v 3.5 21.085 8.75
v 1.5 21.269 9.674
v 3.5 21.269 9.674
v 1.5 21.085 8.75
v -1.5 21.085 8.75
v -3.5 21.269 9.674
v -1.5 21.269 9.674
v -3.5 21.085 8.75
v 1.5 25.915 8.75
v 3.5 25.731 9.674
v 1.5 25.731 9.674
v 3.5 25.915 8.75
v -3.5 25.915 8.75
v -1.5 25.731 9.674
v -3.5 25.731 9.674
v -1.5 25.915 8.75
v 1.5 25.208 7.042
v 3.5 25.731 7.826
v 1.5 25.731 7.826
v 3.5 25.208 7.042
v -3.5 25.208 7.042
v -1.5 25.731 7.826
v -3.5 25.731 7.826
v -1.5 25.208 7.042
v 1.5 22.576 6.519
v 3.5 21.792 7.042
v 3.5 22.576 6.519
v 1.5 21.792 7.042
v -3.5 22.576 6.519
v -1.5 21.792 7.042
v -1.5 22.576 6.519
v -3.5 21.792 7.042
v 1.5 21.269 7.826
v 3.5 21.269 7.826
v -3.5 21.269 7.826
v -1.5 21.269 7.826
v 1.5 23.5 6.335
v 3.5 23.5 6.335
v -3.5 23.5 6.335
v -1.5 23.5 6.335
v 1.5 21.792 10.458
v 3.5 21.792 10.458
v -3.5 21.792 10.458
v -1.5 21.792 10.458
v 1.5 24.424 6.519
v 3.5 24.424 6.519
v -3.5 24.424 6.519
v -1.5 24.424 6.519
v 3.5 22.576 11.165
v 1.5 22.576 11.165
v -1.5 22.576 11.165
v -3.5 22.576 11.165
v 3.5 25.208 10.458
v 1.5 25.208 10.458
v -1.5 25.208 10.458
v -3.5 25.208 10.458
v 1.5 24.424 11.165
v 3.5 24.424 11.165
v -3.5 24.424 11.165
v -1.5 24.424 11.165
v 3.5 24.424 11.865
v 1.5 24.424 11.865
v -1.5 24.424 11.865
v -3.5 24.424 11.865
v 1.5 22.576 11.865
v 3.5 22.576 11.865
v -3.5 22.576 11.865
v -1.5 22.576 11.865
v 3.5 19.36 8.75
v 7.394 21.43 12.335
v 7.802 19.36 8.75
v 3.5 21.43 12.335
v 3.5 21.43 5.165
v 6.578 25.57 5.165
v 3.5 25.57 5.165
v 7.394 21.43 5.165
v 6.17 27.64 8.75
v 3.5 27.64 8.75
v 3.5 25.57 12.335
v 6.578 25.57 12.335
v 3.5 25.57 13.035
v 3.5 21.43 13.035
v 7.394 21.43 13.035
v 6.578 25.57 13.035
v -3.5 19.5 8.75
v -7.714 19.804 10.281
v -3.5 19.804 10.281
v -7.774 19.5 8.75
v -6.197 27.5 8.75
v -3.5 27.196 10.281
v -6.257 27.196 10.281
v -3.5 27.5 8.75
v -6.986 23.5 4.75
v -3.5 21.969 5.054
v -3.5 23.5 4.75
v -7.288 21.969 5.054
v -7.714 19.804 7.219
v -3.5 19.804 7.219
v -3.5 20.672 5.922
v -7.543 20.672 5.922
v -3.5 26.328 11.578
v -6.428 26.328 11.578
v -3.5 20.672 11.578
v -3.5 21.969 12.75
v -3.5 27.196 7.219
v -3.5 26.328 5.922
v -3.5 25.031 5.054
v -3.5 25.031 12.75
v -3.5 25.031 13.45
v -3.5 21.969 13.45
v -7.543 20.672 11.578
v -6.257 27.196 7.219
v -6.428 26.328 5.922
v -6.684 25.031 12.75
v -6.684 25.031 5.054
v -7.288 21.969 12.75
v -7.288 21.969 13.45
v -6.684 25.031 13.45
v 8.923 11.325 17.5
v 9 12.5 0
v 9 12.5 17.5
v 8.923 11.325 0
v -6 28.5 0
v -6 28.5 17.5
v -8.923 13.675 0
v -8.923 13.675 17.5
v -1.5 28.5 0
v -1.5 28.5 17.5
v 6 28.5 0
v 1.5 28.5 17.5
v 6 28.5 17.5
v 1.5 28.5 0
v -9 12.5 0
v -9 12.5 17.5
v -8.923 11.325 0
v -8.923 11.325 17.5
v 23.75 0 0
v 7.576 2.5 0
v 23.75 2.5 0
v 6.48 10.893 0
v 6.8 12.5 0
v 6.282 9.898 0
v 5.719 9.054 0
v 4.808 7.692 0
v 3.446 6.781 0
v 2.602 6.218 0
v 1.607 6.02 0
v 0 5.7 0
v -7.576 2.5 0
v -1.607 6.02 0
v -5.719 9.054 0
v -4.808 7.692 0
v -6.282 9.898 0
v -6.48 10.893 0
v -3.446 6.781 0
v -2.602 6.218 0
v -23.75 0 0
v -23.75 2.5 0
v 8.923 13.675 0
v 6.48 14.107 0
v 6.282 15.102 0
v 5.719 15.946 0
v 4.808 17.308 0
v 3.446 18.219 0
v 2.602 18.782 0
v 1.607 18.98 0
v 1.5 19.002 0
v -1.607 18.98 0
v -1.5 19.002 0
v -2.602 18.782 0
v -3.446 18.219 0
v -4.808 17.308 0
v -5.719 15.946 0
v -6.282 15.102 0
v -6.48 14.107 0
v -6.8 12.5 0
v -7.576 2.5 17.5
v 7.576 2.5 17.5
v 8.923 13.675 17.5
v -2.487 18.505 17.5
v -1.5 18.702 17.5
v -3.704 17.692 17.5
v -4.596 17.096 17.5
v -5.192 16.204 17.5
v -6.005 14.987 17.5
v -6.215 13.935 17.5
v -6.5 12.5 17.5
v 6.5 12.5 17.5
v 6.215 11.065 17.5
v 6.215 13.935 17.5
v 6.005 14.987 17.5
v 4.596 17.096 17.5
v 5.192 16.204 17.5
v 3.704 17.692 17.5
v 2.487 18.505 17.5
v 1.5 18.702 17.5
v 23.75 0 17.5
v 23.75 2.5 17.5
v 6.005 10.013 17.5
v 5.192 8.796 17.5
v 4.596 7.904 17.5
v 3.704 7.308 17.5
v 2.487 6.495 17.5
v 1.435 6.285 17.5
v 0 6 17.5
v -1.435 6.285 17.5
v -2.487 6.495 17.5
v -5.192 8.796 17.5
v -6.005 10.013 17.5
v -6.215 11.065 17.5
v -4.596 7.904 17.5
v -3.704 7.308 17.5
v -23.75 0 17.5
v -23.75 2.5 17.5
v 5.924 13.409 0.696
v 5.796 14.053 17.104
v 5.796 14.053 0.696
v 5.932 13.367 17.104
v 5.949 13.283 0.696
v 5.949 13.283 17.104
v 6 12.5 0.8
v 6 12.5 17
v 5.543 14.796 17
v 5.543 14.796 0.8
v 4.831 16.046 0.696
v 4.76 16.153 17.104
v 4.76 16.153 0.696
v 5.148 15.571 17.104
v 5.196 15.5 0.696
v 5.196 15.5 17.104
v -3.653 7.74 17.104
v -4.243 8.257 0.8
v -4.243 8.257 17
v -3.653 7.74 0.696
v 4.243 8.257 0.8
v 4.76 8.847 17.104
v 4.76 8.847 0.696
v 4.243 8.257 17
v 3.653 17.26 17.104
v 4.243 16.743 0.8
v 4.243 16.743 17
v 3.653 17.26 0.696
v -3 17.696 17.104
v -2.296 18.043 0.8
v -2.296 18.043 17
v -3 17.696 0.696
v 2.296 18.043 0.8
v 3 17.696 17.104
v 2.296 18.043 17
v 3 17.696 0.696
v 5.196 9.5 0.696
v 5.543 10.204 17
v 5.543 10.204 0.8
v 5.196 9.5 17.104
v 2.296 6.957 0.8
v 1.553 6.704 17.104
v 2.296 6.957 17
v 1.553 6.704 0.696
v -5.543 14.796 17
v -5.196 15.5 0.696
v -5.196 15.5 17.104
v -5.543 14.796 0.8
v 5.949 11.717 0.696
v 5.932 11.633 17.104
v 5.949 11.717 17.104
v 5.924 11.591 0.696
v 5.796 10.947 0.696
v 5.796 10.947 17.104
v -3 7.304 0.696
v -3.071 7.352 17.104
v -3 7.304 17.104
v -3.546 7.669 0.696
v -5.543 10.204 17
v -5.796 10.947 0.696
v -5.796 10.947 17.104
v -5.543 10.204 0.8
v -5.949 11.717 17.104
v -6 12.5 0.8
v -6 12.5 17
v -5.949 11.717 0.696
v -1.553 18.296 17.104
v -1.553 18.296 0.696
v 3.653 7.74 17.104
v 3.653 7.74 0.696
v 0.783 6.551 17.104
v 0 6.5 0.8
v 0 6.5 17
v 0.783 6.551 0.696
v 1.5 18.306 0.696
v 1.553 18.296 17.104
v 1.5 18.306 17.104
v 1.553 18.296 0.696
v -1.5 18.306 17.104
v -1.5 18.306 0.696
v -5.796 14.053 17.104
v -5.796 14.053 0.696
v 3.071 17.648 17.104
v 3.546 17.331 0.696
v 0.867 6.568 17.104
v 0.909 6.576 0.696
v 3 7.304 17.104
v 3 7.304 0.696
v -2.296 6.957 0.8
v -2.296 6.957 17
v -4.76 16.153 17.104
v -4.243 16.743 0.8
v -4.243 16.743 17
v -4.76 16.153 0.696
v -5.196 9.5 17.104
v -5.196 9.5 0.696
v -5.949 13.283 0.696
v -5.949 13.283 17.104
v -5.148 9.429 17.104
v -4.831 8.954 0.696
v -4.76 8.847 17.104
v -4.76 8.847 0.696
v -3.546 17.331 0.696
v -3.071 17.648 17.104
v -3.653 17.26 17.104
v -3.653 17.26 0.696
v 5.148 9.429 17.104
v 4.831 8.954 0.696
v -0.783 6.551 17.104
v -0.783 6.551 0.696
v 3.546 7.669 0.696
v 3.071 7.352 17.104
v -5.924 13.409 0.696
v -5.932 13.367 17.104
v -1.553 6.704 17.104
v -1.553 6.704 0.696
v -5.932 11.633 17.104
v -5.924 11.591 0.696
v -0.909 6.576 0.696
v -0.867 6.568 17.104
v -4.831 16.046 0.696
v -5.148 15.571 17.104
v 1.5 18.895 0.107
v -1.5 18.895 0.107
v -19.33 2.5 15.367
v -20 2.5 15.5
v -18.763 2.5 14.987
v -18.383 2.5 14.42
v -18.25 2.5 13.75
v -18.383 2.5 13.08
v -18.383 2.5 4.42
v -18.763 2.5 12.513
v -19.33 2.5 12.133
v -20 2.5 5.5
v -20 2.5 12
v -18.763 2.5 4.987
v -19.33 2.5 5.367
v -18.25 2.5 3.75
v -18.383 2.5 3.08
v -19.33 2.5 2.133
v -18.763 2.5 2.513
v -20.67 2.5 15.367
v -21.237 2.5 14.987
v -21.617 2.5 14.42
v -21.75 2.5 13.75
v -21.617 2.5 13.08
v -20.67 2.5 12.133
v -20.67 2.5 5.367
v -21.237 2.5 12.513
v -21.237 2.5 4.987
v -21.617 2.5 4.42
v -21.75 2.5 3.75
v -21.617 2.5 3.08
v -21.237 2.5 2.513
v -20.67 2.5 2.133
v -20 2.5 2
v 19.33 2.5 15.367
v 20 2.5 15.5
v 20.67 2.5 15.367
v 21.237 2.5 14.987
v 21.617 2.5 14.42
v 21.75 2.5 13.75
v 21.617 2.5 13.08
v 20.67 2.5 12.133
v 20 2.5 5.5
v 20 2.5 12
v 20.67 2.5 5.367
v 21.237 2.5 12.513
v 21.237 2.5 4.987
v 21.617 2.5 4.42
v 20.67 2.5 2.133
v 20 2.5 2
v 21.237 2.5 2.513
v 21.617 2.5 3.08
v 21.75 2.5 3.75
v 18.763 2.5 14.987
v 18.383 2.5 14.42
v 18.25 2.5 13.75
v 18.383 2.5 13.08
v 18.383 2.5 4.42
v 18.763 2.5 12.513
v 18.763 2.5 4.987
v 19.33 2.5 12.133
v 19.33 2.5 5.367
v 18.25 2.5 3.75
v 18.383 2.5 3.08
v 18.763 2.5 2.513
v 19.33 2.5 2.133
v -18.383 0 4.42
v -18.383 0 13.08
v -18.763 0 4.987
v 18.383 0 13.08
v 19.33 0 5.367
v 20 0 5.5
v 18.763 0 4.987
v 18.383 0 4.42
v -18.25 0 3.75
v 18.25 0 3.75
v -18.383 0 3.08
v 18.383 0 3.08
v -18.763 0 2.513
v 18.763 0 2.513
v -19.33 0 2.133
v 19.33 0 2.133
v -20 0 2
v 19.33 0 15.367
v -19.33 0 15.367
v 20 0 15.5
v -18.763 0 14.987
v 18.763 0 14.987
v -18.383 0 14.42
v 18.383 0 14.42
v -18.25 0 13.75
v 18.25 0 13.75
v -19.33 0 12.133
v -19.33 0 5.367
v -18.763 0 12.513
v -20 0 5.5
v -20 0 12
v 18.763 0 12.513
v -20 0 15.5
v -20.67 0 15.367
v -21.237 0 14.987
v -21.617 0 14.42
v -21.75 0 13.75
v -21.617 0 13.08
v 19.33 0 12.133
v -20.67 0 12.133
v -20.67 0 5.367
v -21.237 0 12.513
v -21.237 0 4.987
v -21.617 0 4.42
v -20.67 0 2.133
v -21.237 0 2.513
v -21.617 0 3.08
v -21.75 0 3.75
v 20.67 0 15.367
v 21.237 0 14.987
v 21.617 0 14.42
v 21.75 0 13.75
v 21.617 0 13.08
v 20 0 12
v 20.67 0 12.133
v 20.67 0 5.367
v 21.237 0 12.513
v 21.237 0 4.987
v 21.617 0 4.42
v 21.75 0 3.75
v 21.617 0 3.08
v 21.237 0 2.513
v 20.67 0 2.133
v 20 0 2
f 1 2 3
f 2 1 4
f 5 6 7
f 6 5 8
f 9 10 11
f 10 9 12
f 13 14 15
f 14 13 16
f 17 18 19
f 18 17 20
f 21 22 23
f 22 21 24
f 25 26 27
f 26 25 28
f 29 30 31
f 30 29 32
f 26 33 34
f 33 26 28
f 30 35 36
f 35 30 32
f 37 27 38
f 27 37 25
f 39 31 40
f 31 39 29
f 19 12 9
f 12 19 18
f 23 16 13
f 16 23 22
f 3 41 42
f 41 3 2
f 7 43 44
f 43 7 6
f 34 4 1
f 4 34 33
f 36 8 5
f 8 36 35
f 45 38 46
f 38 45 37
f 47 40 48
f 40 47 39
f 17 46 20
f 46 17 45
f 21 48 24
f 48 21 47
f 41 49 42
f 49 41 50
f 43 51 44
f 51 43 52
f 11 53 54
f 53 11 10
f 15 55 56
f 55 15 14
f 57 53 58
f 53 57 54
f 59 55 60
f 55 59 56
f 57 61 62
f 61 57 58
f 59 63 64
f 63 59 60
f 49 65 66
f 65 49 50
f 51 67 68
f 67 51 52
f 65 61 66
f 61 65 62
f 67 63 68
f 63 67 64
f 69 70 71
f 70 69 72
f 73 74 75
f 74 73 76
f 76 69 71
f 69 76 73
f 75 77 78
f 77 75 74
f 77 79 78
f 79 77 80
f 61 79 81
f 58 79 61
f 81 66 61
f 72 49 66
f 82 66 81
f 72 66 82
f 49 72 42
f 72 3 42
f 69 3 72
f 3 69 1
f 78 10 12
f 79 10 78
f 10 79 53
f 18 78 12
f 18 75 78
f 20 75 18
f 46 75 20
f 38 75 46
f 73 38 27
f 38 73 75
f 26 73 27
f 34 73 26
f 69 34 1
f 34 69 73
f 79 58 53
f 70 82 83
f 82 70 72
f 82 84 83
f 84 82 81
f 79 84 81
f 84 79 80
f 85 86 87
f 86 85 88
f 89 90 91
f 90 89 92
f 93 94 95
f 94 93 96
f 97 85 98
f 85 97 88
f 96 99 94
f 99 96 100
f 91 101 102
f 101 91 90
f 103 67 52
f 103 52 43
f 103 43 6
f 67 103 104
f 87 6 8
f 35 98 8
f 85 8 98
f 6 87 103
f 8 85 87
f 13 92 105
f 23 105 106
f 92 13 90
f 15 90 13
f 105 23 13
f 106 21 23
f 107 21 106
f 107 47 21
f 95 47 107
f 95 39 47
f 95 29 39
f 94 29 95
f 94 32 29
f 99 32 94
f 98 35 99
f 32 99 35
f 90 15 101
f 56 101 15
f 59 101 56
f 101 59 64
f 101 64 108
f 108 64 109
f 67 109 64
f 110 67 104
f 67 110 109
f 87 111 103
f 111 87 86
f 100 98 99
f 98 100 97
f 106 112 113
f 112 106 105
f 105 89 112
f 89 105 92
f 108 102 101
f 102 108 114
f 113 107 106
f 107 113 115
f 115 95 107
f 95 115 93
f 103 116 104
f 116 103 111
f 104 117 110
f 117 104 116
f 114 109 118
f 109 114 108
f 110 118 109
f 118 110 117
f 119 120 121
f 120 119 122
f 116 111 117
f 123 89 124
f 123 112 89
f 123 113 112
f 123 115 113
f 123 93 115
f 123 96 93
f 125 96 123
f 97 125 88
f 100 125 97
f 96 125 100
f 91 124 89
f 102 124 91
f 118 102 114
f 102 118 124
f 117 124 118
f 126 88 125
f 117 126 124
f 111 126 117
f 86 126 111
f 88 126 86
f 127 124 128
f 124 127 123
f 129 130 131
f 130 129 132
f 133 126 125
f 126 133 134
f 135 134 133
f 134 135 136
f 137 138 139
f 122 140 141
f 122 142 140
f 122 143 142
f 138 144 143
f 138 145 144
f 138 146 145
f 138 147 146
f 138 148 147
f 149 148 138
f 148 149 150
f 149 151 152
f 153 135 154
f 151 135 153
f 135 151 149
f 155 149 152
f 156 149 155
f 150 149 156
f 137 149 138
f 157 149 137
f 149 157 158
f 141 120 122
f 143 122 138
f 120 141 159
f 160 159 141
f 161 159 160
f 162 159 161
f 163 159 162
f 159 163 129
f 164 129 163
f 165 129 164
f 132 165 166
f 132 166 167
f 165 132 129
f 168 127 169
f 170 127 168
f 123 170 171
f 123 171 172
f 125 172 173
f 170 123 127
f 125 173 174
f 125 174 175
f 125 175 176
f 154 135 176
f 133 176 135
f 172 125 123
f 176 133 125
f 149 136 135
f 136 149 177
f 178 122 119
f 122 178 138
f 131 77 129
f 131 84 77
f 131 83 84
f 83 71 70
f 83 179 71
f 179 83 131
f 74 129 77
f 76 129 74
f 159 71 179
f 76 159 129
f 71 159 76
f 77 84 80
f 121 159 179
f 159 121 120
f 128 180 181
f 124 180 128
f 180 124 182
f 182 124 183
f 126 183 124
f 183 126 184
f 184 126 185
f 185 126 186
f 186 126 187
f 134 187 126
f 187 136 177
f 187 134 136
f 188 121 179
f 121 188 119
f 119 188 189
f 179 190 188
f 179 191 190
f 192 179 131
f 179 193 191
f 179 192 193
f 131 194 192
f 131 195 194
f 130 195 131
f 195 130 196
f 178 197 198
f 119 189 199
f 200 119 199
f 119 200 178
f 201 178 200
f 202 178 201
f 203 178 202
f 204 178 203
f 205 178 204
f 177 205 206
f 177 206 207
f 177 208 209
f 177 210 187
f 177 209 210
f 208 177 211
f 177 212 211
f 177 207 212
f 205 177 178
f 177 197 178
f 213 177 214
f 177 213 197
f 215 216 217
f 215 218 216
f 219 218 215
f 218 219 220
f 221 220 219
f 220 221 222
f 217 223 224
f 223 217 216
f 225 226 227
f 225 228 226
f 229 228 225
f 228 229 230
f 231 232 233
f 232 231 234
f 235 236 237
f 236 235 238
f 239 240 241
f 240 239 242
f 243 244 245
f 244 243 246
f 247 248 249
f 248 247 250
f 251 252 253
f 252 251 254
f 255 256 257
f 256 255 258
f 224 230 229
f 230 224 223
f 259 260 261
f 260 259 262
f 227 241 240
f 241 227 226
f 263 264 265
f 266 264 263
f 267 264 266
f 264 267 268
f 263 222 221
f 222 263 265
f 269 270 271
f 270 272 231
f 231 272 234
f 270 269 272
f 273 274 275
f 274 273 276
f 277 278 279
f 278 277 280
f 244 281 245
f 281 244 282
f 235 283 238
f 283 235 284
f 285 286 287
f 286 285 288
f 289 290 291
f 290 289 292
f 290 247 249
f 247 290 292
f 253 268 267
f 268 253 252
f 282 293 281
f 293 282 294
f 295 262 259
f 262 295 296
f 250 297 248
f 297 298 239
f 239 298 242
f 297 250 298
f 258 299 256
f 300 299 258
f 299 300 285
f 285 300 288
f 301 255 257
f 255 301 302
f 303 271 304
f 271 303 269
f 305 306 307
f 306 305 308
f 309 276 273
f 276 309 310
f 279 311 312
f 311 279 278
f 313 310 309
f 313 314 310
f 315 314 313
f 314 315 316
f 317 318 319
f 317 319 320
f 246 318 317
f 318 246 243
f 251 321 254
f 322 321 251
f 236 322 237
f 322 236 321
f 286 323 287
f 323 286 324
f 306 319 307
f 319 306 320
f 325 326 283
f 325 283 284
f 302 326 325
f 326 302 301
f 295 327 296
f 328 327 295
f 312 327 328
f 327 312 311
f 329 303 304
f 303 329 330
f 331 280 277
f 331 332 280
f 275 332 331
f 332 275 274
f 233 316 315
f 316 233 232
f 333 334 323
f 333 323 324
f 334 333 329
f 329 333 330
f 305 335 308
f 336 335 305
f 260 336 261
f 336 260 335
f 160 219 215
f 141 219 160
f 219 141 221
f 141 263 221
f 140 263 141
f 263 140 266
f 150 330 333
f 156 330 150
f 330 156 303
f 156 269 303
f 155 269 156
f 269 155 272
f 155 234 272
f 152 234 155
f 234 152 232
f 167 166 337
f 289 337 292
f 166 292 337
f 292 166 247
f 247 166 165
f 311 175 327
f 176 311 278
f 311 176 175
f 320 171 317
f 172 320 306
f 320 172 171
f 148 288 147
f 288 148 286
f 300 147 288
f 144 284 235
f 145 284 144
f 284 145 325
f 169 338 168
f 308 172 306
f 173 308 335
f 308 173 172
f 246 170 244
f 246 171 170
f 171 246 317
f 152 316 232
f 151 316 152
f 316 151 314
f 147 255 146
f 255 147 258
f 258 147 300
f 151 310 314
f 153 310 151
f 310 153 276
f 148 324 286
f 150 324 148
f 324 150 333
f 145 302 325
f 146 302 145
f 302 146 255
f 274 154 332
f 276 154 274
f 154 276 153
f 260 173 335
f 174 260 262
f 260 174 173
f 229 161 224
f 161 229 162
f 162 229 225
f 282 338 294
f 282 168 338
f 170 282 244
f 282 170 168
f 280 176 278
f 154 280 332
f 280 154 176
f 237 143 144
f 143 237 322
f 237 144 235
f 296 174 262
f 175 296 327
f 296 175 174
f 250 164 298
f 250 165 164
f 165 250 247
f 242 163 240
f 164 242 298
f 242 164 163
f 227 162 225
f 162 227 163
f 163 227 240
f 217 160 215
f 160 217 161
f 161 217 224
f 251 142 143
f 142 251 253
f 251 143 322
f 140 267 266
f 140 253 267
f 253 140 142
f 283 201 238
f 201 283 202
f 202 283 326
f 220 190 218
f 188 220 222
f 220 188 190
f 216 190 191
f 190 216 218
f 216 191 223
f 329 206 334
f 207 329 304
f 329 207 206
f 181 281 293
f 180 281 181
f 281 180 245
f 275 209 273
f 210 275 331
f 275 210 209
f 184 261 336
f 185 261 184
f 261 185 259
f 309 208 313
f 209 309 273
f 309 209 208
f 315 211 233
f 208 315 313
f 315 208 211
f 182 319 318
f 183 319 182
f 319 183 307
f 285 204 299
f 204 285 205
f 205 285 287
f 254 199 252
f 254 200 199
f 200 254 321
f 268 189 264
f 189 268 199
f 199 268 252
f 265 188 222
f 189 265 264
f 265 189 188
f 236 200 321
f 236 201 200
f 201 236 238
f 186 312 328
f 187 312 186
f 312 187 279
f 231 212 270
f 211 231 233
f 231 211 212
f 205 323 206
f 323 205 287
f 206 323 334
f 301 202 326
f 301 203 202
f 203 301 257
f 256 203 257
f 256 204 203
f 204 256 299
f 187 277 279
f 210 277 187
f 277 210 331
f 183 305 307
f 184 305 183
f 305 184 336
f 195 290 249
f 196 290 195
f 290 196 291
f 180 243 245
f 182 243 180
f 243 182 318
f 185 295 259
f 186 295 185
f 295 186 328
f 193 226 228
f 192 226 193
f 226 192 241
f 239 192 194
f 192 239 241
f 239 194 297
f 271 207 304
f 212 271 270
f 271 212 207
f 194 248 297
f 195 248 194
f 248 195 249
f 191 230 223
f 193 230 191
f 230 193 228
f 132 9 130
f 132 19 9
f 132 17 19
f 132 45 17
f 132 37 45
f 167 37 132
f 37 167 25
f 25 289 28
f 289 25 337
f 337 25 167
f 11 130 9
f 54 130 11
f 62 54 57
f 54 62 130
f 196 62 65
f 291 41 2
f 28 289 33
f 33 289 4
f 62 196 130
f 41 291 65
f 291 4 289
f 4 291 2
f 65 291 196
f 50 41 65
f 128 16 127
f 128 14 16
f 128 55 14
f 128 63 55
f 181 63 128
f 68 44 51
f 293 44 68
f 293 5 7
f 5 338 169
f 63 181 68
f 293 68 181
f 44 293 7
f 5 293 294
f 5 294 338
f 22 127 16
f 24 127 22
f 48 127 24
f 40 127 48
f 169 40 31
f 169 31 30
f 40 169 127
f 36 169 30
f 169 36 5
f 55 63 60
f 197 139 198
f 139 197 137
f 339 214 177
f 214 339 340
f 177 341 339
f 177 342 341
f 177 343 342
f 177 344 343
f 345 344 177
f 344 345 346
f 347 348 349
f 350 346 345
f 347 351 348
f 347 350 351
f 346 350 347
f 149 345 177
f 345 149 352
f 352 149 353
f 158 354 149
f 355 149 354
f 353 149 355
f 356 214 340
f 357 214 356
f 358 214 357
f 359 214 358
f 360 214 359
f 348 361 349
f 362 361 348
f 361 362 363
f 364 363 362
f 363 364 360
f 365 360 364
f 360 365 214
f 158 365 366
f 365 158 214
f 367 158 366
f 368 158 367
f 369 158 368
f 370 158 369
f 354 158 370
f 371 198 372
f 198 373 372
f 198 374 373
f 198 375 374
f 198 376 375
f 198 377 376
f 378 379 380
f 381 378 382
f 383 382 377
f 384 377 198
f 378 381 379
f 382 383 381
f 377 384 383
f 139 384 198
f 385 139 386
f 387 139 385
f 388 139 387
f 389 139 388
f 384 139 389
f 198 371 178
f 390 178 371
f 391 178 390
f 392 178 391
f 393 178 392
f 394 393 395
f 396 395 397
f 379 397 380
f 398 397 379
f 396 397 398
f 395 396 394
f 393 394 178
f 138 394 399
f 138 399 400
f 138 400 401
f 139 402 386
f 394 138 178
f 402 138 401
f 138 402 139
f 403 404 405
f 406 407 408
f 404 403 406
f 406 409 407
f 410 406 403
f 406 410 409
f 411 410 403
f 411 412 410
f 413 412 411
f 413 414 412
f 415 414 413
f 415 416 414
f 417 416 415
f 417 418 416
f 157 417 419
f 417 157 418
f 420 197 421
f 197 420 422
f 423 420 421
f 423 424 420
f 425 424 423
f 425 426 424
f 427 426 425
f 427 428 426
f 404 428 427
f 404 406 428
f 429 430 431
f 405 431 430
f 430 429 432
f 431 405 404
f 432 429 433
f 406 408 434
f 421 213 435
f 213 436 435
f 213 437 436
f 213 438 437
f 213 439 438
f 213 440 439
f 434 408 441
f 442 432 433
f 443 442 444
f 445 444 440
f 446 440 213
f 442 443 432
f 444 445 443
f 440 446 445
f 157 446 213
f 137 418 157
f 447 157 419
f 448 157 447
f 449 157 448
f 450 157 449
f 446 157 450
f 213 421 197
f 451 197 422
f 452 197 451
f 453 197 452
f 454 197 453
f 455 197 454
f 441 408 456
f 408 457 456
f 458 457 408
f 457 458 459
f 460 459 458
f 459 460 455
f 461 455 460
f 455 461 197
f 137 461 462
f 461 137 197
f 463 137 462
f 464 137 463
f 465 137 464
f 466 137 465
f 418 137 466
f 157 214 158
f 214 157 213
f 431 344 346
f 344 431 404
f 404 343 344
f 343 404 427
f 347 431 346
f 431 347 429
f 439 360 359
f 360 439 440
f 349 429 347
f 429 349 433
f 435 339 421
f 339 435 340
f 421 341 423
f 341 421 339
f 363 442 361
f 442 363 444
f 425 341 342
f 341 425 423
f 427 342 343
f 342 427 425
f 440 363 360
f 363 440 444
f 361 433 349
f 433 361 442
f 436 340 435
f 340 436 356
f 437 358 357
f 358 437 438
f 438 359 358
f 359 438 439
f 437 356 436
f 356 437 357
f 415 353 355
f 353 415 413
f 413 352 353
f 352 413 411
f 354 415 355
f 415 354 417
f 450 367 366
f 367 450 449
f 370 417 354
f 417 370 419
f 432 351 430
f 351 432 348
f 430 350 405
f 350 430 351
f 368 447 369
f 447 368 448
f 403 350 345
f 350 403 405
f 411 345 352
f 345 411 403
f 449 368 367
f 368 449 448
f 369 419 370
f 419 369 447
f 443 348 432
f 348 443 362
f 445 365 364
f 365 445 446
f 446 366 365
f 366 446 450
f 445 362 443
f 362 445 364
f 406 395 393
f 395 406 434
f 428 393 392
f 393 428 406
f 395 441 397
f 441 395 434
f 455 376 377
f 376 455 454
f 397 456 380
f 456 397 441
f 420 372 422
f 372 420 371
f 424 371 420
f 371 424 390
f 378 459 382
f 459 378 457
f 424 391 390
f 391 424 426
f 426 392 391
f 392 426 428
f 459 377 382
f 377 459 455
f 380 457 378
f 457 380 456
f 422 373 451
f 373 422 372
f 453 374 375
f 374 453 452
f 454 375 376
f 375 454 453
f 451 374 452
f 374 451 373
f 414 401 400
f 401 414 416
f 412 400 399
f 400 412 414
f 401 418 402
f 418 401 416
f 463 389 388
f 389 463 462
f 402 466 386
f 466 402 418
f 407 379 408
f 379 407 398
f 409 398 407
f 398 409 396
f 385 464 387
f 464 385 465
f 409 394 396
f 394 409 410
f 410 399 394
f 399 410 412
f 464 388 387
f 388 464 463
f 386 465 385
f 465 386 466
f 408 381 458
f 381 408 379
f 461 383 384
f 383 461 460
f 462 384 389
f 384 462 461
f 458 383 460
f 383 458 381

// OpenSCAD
// file: ../parameters.scad
/*
  Useful settings/parameters for the OpenFlexure fibre stage
*/
version_numstring = "0.2.1";
stage = [37,20,5]; // dimensions of stage part
beam_height = 100; // 75 <<<<<< height of beam above the table
stage_to_beam_height = 12.5;
stage_height = beam_height - stage_to_beam_height; //bottom of base to top surface of the stage 
 // NB platform_z sets the distance from bottom of the body to top of the stage
 // stage_height determines the thickness of the base.
brim_r = 0;

// Range of travel is lever length * flex_a
xy_lever = 20;  // 10 <<<<<<<<<<<<<<<<<<<<<
z_lever = 20;   // 10 <<<<<<<<<<<<<<<<<<<<<

// Mechanical reduction settings
xy_stage_reduction = 30/xy_lever; //ratio of sample motion to lower shelf motion
xy_reduction = 50/xy_lever; //mechanical reduction from screw to sample
z_reduction = 50/z_lever; //mechanical reduction for Z

// Motor lugs
motor_lugs = true;

// fixed platform for fibre launch
//fixed_platform = false; // this is overwritten later on with the dimensions anyway.

// Mounting holes
breadboard_lugs="diagonal"; //sets the hole pattern for bolting it down.  See the options below.

// Flexure dimensions - good for PLA and ~0.5mm nozzle
zflex = [6, 1.5, 0.75]; //dimensions of flexure
xflex = [5,5.5,5]; //default bounding box of x flexure
xflex_t = 1; //thickness of bendy bit in x
flex_a = 0.1; //angle through which flexures are bent, radians, 0.1 <<<<<
dz = 0.5; //thickness before a bridge is printable-on

xy_travel = xy_lever * flex_a; //max. travel in X or Y
xy_bottom_travel = xy_travel * xy_stage_reduction; //travel of bottom of XY stage
xy_actuator_pivot_w = 25; //width of the hinge for the actuating lever
actuator_h = 26; //height of actuator columns (~screw length)

pushstick = [5,38,5]; //cross-section of XY "push stick"
pw = pushstick[0]; //because this is used in a lot of places...

wall_t = 1.6;
d=0.05;

// Height of the bridging "shelves" in the XY axis "table" structure
shelf_z1 = xy_lever * xy_stage_reduction;
shelf_z2 = shelf_z1 + xy_lever;

// Z axis geometry
z_travel = z_lever * flex_a; //max. travel in Z
z_stage_base_y = -stage[1]/2-xy_bottom_travel; //position of the flexure edge of the Z stage
z_stage_base_w = stage[0] + 2*zflex[1] - 2*xy_bottom_travel - 2; //width of the flexure edge of the Z stage
z_anchor_bottom_y = z_stage_base_y - z_lever - zflex[1]; // lower Z stage end of the fixed base
z_actuator_pivot_y = stage[1]/2 + zflex[1] + zflex[0] + xy_bottom_travel + wall_t;
z_actuator_pivot_w = 20; //width of the hinge for the Z actuator lever
z_pushstick_z = shelf_z1 - pw - 2.5; // height of the Z pushstick

// Mounting stuff
// By default, place 3 mounting holes to align the centre of the stage with a hole.
// setting beam_between_holes adds another set of holes, putting the beam halfway between
bolt_spacing = 25; // change to 25.4 for imperial tables
mounting_bolts_alongholes = [[-1,0,0],[0,-1,0],[1,0,0]]*1.5*bolt_spacing; //beam aligned with holes
mounting_bolts_betweenholes = [[-1.25,-0.25,0],[1.25,0.25,0],[-0.25,-1.25,0]]*1.41*bolt_spacing;
mounting_bolts_atsides = [[-1.5,0,0],[1.5,0,0],[-1.5,-1,0],[1.5,-1,0]] * bolt_spacing;
mounting_bolts_diagonal = concat(mounting_bolts_alongholes, 
                                 mounting_bolts_betweenholes);
// I hope you'll excuse the stacked ternaries, this is an unpleasant necessity :(
mounting_bolts = breadboard_lugs=="atsides"?mounting_bolts_sides:
                 breadboard_lugs=="diagonal"?mounting_bolts_diagonal:
                 breadboard_lugs=="alongholes"?mounting_bolts_alongholes:
                 breadboard_lugs=="betweenholes"?mounting_bolts_betweenholes:
                 /*breadboard_lugs=="none"?*/[];
            
platform_z = shelf_z2 + stage[2] + 22.5; // 7 <<<<<<< The platform is a fixed height above the moving stage
fixed_platform_standoff = 10;
fixed_platform = [50,40,4];
platform_gap = xy_travel + 1;

//term for calculating casing size
casing_size_s = xy_bottom_travel + zflex[1] + zflex[0] + 0.5 + wall_t;
//casing size
casing_size = stage + [2*casing_size_s,casing_size_s + (-z_anchor_bottom_y-stage[1]/2) + wall_t,shelf_z2];
casing_top = shelf_z2 + stage[2] - z_travel; // top of the wall
max_actuator_travel = max(xy_travel*xy_reduction, z_travel*z_reduction); // maximum distance the actuators protrude below the stage
base_height = stage_height - platform_z; // the base takes up any height not use by the body.
if(base_height < max_actuator_travel + 4) echo("WARNING: stage_height is too low, base will not compile properly!");

//foot_height is required for the actuator assembly tools
foot_height = 20;
// file: cylinder_clamp.scad
use <../utilities.scad>;
d=0.05;

//for 1 inch/25mm post clamp, an inner radius of 12.8 is good.
	
module cylinder_clamp(
	inner_r=12.8, //radius of the cylinder being clamped (ish!)
	clamp_h=11, //thicknedess of the clamp along the cylinder axis
	clamp_t=4, //thickness of the clamp radially
	flat_t=8, //how thick the bottom of the clamp is (often need to allow for the mounting bolt head here)
	flat_width=15, //width of the flat base
	mounting_bolt=4, //nominal size of mounting bolt (default is 4 for M4, 0 to disable)
	nut_trap=false,
	bevel_top=0.5, //size of 45 degree bevel on top surface
	bevel_bottom=0.8 //size of 45 degree bevel on bottom of hole
	){
	assign(
		post_r = inner_r, //poor initial choice of name!
		bolt_flat_w=10, //width of the region where the bolt is
		gap_w=3 //size of the gap that is squeezed by the bolt
	)
	difference(){
		hull(){
			cylinder(h=clamp_h,r=post_r+clamp_t,center=true,$fn=48);
			translate([0,-post_r-flat_t/2,0]) cube([flat_width,flat_t,clamp_h],center=true);
			translate([0,post_r+bolt_flat_w/2,0]) cube([12,bolt_flat_w,clamp_h],center=true);
		}
	
		cylinder(h=9999,r=post_r,center=true,$fn=48); //cylinder being clamped
		//bevels, top and bottom
		translate([0,0,-clamp_h/2]) cylinder(r1=post_r+3*bevel_bottom,r2=post_r-bevel_bottom,h=4*bevel_bottom,center=true);
		translate([0,0,clamp_h/2]) cylinder(r2=post_r+3*bevel_top,r1=post_r-bevel_top,h=4*bevel_top,center=true);
		//gap (squeezed by bolt)
		translate([0,999,0]) cube([gap_w,999*2,999],center=true); //gap
	
		//clamping bolt
		translate([gap_w/2+2,post_r+bolt_flat_w/2,0]) rotate([0,0,-90]) nut_y(4,h=999,shaft=true);
		translate([-gap_w/2-2,post_r+bolt_flat_w/2,0]) rotate([0,0,90]) cylinder_with_45deg_top(r=4,h=999,$fn=16); //counterbore for nut head
	
		if(mounting_bolt > 0){
			//mounting bolt
			translate([0,-post_r-4.5,0]) rotate([-90,0,0]){
				intersection(){
					rotate([90,0,0])
						if(nut_trap){
							nut_y(mounting_bolt,fudge=1.15,shaft=true,h=999);
						}else{
							screw_y(mounting_bolt,fudge=1.07,shaft=true,h=999);
						}
					cube([inner_r*2,inner_r*2,clamp_h*2],center=true);
				}
			}
		}
		//in the case of thick clamps with thin flats, this keeps the bottom flat
		translate([0,-inner_r-flat_t-999,0]) cube([9999,999*2,9999],center=true);
	}
}

module cylinder_clamp_v(
	inner_r=12.8, //radius of the cylinder being clamped (ish!)
	clamp_h=10, //width of the clamp along the cylinder (y) axis
	clamp_t=4, //thickness of the clamp radially
	flat_t=8, //how thick the bottom of the clamp is (often need to allow for the mounting bolt head here)
	flat_width=15, //width of the flat base
	mounting_bolt=4, //nominal size of mounting bolt (default is 4 for M4, 0 to disable)
	bevel=0.5 //put a 45 degree bevel on the edges of the hole
	){
	assign(
		post_r = inner_r, //poor initial choice of name!
		bolt_flat_w=11, //width of the region where the bolt is
		gap_w=2*inner_r*sin(45/2),//sin(acos(1-(9/2-4/2*1.22)/inner_r))*inner_r //size of the gap that is squeezed by the bolt
		bolt_z = inner_r+4/2*1.22+d //position of bolt (so bolt just clears the cylinder we're clamping
	)assign( //the second assign statement allows us to use gap_w
		bolt_span=gap_w+4+d//max(2*inner_r*sin(acos(1-(9/2-4/2*1.22)/inner_r)), gap_w+4)
	)
	difference(){
		hull(){
			rotate([90,0,0]) cylinder(h=clamp_h,r=inner_r+clamp_t,center=true,$fn=48);
			translate([0,0,-inner_r-flat_t/2]) cube([flat_width,clamp_h,flat_t],center=true);
			translate([0,0,bolt_z]) cube([gap_w+9,clamp_h,bolt_flat_w],center=true);
		}
	
		cylinder_with_45deg_top(h=9999,r=post_r,center=true,$fn=48); //cylinder being clamped
		reflect([0,1,0]) translate([0,clamp_h/2,0]) rotate([90,0,0]) cylinder(r1=post_r+3*bevel,r2=post_r-bevel,h=4*bevel,center=true); //bevel
		translate([0,0,999]) cube([gap_w,999,999*2],center=true); //gap
	
		//clamping bolt
		translate([bolt_span/2,0,bolt_z]) rotate([0,0,-90]) nut_y(4,h=999,shaft=true);
		translate([-bolt_span/2,0,bolt_z]) rotate([0,0,90]) cylinder_with_45deg_top(r=4,h=999,$fn=16); //counterbore for nut head
	
		if(mounting_bolt > 0){
			//mounting bolt
			translate([0,0,-post_r-4.5]){
				cylinder(r=mounting_bolt*1.1,h=post_r,$fn=16);
				cylinder(r=mounting_bolt/2*1.22,h=flat_t*2,center=true,$fn=16);
			}
		}
		translate([0,0,-inner_r-flat_t-999]) cube([9999,9999,999*2],center=true);
	}
}

translate([0,30,0]) cylinder_clamp_v(30.5/2, 10, flat_width=24, mounting_bolt=4, flat_t=8);

cylinder_clamp(30.5/2, flat_width=24, mounting_bolt=4, flat_t=8,nut_trap=true);
// main file
/*

An adapter to fit an 11mm diameter laser diode module to the stage

(c) 2018 Richard Bowman - released under CERN Open Hardware License

*/

use <../utilities.scad>;
use <cylinder_clamp.scad>;
include <../parameters.scad>;

hole_sep = 40;
hole_d = 3.5;
beam_h = stage_to_beam_height;
d = 0.05;

w = hole_sep + hole_d + 4;
t = hole_d+4+10;
$fn=16;

rotate([-90,0,0]) translate([0,-t,0]) difference(){
    union(){
        translate([-w/2,0,0]) cube([w,t,2.5]); //mounts to two holes
        //translate([-10/2,0,0]) cube([15,t,]);
        translate([0,t/2,12.5]) rotate([90,0,0]) 
            cylinder_clamp(inner_r=11/2+0.5,
                           clamp_h=t,
                           clamp_t=3,
                           flat_t=10-11/2,
                           flat_width=15,
                           mounting_bolt=0);
    }
    
    reflect([1,0,0]) repeat([0,10,0],2) translate([-hole_sep/2,hole_d/2+2,3]){
        cylinder(d=hole_d,h=999, center=true);
        cylinder(d=4,h=999);
    }
    translate([0,-99,beam_h]) rotate([-90,0,0]) cylinder(d=3.3, h=999);

}
